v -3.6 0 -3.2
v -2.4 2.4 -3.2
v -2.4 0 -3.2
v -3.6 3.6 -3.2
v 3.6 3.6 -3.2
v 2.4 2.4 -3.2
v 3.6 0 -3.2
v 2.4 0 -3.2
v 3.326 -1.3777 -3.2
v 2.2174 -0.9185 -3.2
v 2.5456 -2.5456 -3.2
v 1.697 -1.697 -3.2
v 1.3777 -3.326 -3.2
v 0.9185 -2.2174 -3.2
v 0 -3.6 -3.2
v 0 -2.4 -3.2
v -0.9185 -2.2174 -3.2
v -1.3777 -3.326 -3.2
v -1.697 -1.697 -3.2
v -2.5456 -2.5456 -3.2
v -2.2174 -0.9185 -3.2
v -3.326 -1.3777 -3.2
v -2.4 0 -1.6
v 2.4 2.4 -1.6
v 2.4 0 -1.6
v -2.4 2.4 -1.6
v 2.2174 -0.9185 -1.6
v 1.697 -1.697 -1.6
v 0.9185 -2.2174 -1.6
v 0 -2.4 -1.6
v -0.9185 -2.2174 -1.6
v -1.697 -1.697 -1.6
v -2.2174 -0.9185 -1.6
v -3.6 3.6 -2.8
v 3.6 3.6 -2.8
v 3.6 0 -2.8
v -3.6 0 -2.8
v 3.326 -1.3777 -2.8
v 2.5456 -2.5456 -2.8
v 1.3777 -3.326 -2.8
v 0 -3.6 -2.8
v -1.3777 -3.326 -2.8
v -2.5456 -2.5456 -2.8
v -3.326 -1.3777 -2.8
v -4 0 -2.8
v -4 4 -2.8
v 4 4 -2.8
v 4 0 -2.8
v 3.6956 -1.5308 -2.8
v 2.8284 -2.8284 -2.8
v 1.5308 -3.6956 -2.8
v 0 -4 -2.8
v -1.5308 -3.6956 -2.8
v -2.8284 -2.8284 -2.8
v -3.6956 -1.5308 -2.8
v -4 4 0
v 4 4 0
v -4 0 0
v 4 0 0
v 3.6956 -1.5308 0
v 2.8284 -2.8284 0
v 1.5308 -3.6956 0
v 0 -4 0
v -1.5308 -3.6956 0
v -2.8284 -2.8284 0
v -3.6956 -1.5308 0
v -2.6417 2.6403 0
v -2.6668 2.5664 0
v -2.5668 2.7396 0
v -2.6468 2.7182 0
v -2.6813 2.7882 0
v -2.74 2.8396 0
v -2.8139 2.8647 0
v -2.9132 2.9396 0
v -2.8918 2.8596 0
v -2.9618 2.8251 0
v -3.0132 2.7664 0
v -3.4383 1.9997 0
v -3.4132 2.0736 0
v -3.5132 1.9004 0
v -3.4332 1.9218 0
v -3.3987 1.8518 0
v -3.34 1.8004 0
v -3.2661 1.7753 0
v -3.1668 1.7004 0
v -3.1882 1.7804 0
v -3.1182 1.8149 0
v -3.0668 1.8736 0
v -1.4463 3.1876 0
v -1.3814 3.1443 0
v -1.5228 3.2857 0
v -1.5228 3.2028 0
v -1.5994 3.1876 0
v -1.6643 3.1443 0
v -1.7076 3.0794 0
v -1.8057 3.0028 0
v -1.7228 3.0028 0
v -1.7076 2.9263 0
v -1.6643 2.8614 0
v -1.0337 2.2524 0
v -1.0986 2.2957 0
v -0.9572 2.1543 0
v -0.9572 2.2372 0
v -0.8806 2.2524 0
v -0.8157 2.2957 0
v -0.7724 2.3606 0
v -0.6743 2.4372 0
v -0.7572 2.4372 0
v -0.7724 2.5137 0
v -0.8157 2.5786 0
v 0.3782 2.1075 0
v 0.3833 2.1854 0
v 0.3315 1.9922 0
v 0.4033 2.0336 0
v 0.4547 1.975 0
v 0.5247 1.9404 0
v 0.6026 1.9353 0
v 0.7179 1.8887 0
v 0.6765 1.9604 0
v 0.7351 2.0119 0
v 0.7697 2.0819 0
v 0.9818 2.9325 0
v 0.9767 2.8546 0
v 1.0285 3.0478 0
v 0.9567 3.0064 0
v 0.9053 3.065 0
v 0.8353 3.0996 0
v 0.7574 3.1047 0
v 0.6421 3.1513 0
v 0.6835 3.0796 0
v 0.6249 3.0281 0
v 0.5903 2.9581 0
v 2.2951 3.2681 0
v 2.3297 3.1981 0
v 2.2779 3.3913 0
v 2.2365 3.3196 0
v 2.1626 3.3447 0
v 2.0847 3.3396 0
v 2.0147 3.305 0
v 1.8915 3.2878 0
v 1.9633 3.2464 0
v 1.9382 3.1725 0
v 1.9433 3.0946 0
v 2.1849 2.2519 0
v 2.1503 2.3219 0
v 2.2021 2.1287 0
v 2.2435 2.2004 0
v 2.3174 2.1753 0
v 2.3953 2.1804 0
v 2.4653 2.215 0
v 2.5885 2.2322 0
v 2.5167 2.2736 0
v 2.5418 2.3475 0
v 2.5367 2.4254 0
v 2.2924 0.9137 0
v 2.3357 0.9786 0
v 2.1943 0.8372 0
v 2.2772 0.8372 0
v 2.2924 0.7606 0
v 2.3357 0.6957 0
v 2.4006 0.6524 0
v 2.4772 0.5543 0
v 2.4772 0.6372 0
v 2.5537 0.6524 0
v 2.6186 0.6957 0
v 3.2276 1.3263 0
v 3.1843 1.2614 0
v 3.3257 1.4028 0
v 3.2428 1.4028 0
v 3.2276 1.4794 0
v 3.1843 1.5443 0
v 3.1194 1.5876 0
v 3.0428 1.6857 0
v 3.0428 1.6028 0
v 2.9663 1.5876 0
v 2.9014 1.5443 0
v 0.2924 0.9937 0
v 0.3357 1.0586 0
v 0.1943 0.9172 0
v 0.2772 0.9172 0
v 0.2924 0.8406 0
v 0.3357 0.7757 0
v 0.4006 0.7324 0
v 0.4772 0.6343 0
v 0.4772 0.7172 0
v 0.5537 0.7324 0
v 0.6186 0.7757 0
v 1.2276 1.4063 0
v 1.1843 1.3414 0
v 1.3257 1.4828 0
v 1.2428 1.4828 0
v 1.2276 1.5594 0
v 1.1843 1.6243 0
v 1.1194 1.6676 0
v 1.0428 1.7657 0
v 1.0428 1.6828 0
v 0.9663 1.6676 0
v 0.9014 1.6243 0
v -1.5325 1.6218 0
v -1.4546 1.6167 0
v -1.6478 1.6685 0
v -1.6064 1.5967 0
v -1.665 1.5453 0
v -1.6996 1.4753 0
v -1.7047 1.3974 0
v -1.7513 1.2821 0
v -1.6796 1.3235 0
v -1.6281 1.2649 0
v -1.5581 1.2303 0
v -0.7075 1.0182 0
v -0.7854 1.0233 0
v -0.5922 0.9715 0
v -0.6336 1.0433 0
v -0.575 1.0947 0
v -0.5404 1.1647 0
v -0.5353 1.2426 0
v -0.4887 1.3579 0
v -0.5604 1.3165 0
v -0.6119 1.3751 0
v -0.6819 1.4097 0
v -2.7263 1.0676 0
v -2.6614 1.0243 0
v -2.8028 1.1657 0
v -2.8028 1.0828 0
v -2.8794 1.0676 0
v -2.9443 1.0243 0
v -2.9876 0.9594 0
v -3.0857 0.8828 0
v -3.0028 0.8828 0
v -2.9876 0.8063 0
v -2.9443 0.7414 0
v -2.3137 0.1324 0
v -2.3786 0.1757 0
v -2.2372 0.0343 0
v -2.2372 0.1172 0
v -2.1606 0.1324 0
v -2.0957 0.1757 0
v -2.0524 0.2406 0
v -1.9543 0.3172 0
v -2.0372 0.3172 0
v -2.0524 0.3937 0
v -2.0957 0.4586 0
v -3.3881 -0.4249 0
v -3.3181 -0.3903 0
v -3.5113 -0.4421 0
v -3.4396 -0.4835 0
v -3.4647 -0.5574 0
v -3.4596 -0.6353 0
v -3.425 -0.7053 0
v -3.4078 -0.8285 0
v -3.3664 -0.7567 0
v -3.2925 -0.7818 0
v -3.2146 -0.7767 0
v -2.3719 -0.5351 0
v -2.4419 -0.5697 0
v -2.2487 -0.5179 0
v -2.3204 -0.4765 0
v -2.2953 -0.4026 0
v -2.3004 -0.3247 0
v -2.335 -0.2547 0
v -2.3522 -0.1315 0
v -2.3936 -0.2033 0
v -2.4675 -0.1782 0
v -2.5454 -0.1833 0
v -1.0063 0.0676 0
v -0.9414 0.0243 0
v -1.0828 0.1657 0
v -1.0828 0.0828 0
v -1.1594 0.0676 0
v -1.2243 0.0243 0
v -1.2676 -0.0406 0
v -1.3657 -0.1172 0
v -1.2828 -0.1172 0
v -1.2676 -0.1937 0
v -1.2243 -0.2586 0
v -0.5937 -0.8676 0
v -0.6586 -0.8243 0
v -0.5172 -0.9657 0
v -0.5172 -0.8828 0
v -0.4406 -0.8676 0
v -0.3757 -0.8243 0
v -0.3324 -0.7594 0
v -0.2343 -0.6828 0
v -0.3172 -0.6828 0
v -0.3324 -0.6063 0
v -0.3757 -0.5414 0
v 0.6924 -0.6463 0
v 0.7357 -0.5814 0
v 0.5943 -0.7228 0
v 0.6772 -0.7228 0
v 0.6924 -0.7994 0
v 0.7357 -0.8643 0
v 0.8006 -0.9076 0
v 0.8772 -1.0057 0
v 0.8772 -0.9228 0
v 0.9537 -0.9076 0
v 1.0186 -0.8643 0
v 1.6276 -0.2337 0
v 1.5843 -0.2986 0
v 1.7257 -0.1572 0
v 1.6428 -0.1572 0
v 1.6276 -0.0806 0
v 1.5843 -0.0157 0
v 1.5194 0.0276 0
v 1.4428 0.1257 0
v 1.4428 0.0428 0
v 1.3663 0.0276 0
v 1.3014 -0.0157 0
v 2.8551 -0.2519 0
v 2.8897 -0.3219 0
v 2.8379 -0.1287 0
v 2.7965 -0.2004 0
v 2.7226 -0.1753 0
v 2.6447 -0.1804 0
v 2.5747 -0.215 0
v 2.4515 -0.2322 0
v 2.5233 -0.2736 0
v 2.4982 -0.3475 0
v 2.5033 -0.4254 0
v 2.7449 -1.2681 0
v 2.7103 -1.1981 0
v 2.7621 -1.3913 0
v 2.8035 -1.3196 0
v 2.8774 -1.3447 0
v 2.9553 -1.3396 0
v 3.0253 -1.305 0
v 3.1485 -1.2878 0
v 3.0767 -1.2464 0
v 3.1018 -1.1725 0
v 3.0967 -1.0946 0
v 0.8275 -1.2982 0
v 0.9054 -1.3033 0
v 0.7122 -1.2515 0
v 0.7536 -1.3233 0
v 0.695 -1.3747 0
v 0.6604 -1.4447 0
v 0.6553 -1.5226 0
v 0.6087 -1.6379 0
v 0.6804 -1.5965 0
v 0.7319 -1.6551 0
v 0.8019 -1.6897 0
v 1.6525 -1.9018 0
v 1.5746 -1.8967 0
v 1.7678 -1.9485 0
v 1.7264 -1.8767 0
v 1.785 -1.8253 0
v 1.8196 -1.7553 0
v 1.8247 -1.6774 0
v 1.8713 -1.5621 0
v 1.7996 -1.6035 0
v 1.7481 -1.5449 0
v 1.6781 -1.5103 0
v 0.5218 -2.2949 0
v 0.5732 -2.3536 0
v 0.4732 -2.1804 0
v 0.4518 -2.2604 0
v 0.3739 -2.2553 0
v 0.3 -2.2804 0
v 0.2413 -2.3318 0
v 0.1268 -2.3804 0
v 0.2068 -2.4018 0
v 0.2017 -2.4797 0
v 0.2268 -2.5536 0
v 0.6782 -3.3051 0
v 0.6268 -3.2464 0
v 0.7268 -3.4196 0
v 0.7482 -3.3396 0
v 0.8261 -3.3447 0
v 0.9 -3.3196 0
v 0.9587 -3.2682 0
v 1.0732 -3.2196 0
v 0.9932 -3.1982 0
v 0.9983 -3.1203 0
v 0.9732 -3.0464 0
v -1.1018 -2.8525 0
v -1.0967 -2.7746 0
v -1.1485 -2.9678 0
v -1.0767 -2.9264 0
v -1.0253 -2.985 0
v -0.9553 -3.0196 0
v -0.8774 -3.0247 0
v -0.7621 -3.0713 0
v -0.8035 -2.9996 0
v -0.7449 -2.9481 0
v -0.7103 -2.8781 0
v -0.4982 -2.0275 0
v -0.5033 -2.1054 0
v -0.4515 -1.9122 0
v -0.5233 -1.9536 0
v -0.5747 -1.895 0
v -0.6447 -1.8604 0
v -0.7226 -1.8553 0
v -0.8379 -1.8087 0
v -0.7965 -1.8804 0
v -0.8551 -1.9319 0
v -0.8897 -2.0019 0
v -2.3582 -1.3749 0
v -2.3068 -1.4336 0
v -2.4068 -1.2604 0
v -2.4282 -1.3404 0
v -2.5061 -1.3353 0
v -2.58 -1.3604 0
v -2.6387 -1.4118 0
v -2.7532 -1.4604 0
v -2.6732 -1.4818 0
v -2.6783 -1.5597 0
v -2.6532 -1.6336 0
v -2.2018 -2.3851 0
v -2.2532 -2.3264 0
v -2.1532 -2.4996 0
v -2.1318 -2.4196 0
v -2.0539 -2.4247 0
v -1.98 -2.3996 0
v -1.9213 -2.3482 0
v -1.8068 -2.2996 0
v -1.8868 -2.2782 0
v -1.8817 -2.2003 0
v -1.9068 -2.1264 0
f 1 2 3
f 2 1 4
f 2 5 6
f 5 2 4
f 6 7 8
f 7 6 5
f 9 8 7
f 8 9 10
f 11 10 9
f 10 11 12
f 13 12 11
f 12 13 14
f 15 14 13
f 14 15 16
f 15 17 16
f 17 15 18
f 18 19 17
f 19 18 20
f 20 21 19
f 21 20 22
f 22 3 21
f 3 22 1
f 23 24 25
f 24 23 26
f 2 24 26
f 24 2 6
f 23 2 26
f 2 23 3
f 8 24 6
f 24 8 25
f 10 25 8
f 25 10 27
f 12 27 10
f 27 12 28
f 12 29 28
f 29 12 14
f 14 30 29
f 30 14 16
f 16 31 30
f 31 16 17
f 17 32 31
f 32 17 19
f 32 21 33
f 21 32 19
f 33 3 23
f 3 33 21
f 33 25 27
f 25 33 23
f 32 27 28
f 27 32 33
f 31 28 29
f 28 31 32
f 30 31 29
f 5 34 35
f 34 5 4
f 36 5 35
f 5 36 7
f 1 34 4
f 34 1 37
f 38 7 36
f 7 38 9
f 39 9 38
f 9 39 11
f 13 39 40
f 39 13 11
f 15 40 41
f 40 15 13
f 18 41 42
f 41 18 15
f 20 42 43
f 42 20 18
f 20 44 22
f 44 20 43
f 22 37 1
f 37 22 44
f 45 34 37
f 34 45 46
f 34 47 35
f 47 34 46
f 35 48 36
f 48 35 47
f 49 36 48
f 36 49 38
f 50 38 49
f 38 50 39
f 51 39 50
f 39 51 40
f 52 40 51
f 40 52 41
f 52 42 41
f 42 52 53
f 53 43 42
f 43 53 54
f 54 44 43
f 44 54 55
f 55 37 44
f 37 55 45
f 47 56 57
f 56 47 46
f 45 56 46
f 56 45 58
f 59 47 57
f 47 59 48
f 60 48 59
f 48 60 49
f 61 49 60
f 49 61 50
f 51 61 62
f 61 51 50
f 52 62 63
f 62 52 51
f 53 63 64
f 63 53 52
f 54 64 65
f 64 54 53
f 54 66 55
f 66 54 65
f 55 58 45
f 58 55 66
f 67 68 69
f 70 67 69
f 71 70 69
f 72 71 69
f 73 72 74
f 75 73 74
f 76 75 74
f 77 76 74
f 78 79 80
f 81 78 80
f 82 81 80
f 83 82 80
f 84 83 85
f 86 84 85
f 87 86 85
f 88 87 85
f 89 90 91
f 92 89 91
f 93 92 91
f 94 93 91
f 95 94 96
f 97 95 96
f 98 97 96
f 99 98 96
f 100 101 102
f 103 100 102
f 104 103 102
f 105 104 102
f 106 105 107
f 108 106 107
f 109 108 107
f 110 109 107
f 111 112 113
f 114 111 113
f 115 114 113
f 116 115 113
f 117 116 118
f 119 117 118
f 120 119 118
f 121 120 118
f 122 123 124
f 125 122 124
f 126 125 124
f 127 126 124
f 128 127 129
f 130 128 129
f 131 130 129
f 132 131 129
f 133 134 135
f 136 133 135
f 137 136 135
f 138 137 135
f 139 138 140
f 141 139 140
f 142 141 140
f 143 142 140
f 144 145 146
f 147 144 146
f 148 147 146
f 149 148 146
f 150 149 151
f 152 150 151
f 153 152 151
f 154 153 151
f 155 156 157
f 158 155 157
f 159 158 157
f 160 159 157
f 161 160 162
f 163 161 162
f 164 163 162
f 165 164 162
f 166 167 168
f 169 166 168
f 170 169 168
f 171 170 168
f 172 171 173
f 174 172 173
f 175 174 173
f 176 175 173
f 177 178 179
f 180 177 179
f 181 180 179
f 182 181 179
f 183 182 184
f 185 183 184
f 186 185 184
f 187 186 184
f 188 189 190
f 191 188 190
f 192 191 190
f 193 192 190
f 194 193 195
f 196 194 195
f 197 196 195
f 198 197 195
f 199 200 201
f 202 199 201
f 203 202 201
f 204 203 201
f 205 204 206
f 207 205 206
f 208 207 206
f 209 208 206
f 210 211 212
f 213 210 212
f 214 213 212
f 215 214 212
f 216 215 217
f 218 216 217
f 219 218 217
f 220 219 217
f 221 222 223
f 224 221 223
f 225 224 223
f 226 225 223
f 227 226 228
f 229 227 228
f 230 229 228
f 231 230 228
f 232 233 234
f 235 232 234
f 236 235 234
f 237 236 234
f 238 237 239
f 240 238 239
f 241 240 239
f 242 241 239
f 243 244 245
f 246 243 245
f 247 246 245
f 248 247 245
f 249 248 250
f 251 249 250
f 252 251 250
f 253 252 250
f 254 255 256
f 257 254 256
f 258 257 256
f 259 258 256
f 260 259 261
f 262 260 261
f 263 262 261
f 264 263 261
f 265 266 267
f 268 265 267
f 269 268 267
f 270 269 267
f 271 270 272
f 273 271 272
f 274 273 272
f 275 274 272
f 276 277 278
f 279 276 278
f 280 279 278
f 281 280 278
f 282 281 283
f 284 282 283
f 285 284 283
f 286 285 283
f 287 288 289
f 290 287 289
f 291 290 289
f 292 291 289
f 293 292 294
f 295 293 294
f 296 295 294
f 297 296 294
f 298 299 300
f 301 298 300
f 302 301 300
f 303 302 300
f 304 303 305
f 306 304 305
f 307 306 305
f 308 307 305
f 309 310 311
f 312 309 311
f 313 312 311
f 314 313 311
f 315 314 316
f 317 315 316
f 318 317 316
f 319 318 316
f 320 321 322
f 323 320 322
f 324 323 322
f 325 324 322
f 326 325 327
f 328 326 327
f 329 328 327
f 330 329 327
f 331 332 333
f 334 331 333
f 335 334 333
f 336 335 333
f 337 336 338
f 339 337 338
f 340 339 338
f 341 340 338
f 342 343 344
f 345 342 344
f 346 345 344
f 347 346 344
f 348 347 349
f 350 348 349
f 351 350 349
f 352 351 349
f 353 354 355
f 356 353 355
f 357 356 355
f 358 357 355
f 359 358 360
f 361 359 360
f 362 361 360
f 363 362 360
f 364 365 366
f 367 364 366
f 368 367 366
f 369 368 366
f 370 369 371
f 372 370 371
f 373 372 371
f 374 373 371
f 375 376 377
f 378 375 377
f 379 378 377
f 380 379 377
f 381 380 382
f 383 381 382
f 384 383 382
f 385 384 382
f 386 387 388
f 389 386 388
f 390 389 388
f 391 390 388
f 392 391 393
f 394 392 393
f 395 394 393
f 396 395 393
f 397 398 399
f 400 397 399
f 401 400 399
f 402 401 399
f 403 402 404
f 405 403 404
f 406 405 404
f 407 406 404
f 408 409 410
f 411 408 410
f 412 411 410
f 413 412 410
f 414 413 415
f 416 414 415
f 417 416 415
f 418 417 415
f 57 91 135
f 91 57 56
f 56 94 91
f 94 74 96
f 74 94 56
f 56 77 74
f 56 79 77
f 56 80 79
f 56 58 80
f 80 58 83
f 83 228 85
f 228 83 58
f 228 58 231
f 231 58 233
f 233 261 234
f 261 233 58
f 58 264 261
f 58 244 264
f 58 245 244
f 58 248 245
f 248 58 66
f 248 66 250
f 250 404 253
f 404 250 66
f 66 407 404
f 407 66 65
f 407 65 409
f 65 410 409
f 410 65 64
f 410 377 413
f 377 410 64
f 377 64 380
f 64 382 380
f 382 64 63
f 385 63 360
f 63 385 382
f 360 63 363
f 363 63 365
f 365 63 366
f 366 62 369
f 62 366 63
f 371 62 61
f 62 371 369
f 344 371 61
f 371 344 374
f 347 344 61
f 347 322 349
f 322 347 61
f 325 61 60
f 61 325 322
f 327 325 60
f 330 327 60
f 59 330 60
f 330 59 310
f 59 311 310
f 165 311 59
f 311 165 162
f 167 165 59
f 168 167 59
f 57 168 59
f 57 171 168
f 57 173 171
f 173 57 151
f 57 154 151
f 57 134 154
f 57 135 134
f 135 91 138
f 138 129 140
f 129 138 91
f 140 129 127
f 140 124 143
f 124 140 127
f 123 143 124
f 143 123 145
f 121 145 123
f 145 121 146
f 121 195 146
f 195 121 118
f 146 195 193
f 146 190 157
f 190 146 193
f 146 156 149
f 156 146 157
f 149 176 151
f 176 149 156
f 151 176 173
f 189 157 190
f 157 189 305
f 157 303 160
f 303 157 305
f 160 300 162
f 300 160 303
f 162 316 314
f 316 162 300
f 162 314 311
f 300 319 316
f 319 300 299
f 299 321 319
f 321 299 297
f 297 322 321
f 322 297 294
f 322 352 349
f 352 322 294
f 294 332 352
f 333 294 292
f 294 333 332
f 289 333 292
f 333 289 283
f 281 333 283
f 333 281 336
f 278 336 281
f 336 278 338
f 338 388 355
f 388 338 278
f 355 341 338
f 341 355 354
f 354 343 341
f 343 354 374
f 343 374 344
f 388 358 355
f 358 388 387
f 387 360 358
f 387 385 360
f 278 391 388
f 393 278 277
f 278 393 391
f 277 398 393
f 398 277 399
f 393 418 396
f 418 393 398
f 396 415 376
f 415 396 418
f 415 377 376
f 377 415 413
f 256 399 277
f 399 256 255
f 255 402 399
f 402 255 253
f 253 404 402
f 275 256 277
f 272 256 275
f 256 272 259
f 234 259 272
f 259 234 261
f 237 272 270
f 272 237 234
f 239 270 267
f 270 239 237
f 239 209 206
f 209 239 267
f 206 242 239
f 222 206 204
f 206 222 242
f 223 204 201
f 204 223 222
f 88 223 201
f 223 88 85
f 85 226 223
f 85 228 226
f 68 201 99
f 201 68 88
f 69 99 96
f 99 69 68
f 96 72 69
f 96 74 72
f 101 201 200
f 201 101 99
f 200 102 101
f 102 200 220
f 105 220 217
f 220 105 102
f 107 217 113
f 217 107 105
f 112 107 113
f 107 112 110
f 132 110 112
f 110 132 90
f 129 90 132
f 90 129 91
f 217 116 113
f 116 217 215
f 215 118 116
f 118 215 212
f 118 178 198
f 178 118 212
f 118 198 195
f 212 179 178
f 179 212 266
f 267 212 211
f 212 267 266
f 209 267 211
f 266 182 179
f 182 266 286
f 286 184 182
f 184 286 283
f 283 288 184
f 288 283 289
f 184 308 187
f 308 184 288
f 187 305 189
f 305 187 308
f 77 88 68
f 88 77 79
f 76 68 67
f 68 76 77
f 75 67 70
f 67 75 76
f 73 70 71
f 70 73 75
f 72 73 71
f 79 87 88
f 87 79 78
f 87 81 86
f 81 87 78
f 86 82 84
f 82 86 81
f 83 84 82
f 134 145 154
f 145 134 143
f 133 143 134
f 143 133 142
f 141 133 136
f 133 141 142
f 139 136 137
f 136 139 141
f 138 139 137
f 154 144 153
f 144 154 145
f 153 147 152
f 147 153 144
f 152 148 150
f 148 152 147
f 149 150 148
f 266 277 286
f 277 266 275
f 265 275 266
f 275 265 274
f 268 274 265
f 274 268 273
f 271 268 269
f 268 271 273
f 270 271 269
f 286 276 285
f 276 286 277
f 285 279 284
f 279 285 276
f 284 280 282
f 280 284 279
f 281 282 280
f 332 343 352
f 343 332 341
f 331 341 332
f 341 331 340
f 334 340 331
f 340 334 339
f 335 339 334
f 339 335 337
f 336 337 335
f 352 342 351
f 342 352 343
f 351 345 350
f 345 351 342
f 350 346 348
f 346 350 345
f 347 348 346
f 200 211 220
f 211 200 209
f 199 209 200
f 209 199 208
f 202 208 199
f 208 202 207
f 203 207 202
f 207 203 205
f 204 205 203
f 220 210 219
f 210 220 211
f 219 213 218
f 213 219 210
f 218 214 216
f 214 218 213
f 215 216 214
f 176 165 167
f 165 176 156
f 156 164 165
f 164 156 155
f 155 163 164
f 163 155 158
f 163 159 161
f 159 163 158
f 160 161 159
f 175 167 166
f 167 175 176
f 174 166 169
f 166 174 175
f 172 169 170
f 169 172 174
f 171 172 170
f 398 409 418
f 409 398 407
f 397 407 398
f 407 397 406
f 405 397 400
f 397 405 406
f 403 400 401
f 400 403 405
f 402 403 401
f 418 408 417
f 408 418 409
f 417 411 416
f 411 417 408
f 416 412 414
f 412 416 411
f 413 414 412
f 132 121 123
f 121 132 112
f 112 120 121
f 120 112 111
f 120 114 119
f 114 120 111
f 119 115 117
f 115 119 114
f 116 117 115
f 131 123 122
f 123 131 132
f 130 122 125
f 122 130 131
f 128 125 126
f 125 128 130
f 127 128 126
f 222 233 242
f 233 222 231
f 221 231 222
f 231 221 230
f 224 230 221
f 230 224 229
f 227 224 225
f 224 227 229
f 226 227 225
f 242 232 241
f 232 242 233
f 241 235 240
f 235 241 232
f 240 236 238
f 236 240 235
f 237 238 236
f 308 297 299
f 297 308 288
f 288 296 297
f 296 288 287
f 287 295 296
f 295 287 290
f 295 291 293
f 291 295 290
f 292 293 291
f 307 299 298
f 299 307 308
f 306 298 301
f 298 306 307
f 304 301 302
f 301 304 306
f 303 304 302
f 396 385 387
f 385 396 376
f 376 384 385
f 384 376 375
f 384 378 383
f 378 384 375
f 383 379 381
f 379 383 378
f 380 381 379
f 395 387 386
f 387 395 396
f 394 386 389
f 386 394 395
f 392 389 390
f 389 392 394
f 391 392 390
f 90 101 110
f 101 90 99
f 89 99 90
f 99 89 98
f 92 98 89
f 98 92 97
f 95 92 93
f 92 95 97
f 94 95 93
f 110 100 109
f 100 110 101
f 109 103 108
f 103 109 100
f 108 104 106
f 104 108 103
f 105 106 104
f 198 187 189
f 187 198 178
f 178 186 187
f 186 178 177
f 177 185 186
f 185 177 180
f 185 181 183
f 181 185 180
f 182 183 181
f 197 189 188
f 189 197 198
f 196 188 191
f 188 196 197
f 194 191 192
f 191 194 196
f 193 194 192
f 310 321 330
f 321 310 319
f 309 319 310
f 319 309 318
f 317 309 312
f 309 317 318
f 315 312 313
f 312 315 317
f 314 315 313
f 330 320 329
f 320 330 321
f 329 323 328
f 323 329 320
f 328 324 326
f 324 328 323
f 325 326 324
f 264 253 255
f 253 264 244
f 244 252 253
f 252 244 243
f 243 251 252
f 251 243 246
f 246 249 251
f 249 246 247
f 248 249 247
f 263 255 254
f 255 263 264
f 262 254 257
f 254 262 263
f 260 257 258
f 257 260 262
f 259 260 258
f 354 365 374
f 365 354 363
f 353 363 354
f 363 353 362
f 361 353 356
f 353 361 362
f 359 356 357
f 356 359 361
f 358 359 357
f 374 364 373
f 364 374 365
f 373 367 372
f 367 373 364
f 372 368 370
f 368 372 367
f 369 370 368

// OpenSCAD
use <../lib.scad>
use <s/24246p0as03.scad>
use <s/24246p0as04.scad>
use <s/24246p0as05.scad>
use <s/24246p0as06.scad>
use <s/24246p0as07.scad>
use <s/24246s02.scad>
function ldraw_lib__24246p0a() = [
// 0 Tile  1 x  1 with Rounded End with Bright Pink, Magenta, Orange and Yellow Sprinkles Pattern
// 0 Name: 24246p0a.dat
// 0 Author: Takeshi Takahashi [RainbowDolphin]
// 0 !LDRAW_ORG Part UPDATE 2025-08
// 0 !LICENSE Licensed under CC BY 4.0 : see CAreadme.txt
// 
// 0 BFC CERTIFY CCW
  [0,"BFC","CERTIFY"],
  [0,"BFC","CCW"],
// 
// 0 !KEYWORDS bracelet, Bricklink 24246pb010, Dots, Ice cream
// 0 !KEYWORDS Rebrickable 24246pr0007, Set 41910
// 
// 0 !HISTORY 2025-08-31 [OrionP] Official Update 2025-08
// 
// 
// 1 16 0 0 0 1 0 0 0 1 0 0 0 1 s\24246s02.dat
  [1,16,0,0,0,1,0,0,0,1,0,0,0,1, ldraw_lib__s__24246s02()],
// 1 16 0 0 0 1 0 0 0 1 0 0 0 1 s\24246p0as03.dat
  [1,16,0,0,0,1,0,0,0,1,0,0,0,1, ldraw_lib__s__24246p0as03()],
// 1 29 0 0 0 1 0 0 0 1 0 0 0 1 s\24246p0as04.dat
  [1,29,0,0,0,1,0,0,0,1,0,0,0,1, ldraw_lib__s__24246p0as04()],
// 1 26 0 0 0 1 0 0 0 1 0 0 0 1 s\24246p0as05.dat
  [1,26,0,0,0,1,0,0,0,1,0,0,0,1, ldraw_lib__s__24246p0as05()],
// 1 25 0 0 0 1 0 0 0 1 0 0 0 1 s\24246p0as06.dat
  [1,25,0,0,0,1,0,0,0,1,0,0,0,1, ldraw_lib__s__24246p0as06()],
// 1 14 0 0 0 1 0 0 0 1 0 0 0 1 s\24246p0as07.dat
  [1,14,0,0,0,1,0,0,0,1,0,0,0,1, ldraw_lib__s__24246p0as07()],
];
module ldraw_lib__24246p0a(step=0, col=false, unit=2/5, alt=false, line=0.2, solid=!$preview)
    makepoly(ldraw_lib__24246p0a(), step=step, col=col, unit=unit, alt=alt, line=line, solid=solid);
ldraw_lib__24246p0a(line=0.2);
